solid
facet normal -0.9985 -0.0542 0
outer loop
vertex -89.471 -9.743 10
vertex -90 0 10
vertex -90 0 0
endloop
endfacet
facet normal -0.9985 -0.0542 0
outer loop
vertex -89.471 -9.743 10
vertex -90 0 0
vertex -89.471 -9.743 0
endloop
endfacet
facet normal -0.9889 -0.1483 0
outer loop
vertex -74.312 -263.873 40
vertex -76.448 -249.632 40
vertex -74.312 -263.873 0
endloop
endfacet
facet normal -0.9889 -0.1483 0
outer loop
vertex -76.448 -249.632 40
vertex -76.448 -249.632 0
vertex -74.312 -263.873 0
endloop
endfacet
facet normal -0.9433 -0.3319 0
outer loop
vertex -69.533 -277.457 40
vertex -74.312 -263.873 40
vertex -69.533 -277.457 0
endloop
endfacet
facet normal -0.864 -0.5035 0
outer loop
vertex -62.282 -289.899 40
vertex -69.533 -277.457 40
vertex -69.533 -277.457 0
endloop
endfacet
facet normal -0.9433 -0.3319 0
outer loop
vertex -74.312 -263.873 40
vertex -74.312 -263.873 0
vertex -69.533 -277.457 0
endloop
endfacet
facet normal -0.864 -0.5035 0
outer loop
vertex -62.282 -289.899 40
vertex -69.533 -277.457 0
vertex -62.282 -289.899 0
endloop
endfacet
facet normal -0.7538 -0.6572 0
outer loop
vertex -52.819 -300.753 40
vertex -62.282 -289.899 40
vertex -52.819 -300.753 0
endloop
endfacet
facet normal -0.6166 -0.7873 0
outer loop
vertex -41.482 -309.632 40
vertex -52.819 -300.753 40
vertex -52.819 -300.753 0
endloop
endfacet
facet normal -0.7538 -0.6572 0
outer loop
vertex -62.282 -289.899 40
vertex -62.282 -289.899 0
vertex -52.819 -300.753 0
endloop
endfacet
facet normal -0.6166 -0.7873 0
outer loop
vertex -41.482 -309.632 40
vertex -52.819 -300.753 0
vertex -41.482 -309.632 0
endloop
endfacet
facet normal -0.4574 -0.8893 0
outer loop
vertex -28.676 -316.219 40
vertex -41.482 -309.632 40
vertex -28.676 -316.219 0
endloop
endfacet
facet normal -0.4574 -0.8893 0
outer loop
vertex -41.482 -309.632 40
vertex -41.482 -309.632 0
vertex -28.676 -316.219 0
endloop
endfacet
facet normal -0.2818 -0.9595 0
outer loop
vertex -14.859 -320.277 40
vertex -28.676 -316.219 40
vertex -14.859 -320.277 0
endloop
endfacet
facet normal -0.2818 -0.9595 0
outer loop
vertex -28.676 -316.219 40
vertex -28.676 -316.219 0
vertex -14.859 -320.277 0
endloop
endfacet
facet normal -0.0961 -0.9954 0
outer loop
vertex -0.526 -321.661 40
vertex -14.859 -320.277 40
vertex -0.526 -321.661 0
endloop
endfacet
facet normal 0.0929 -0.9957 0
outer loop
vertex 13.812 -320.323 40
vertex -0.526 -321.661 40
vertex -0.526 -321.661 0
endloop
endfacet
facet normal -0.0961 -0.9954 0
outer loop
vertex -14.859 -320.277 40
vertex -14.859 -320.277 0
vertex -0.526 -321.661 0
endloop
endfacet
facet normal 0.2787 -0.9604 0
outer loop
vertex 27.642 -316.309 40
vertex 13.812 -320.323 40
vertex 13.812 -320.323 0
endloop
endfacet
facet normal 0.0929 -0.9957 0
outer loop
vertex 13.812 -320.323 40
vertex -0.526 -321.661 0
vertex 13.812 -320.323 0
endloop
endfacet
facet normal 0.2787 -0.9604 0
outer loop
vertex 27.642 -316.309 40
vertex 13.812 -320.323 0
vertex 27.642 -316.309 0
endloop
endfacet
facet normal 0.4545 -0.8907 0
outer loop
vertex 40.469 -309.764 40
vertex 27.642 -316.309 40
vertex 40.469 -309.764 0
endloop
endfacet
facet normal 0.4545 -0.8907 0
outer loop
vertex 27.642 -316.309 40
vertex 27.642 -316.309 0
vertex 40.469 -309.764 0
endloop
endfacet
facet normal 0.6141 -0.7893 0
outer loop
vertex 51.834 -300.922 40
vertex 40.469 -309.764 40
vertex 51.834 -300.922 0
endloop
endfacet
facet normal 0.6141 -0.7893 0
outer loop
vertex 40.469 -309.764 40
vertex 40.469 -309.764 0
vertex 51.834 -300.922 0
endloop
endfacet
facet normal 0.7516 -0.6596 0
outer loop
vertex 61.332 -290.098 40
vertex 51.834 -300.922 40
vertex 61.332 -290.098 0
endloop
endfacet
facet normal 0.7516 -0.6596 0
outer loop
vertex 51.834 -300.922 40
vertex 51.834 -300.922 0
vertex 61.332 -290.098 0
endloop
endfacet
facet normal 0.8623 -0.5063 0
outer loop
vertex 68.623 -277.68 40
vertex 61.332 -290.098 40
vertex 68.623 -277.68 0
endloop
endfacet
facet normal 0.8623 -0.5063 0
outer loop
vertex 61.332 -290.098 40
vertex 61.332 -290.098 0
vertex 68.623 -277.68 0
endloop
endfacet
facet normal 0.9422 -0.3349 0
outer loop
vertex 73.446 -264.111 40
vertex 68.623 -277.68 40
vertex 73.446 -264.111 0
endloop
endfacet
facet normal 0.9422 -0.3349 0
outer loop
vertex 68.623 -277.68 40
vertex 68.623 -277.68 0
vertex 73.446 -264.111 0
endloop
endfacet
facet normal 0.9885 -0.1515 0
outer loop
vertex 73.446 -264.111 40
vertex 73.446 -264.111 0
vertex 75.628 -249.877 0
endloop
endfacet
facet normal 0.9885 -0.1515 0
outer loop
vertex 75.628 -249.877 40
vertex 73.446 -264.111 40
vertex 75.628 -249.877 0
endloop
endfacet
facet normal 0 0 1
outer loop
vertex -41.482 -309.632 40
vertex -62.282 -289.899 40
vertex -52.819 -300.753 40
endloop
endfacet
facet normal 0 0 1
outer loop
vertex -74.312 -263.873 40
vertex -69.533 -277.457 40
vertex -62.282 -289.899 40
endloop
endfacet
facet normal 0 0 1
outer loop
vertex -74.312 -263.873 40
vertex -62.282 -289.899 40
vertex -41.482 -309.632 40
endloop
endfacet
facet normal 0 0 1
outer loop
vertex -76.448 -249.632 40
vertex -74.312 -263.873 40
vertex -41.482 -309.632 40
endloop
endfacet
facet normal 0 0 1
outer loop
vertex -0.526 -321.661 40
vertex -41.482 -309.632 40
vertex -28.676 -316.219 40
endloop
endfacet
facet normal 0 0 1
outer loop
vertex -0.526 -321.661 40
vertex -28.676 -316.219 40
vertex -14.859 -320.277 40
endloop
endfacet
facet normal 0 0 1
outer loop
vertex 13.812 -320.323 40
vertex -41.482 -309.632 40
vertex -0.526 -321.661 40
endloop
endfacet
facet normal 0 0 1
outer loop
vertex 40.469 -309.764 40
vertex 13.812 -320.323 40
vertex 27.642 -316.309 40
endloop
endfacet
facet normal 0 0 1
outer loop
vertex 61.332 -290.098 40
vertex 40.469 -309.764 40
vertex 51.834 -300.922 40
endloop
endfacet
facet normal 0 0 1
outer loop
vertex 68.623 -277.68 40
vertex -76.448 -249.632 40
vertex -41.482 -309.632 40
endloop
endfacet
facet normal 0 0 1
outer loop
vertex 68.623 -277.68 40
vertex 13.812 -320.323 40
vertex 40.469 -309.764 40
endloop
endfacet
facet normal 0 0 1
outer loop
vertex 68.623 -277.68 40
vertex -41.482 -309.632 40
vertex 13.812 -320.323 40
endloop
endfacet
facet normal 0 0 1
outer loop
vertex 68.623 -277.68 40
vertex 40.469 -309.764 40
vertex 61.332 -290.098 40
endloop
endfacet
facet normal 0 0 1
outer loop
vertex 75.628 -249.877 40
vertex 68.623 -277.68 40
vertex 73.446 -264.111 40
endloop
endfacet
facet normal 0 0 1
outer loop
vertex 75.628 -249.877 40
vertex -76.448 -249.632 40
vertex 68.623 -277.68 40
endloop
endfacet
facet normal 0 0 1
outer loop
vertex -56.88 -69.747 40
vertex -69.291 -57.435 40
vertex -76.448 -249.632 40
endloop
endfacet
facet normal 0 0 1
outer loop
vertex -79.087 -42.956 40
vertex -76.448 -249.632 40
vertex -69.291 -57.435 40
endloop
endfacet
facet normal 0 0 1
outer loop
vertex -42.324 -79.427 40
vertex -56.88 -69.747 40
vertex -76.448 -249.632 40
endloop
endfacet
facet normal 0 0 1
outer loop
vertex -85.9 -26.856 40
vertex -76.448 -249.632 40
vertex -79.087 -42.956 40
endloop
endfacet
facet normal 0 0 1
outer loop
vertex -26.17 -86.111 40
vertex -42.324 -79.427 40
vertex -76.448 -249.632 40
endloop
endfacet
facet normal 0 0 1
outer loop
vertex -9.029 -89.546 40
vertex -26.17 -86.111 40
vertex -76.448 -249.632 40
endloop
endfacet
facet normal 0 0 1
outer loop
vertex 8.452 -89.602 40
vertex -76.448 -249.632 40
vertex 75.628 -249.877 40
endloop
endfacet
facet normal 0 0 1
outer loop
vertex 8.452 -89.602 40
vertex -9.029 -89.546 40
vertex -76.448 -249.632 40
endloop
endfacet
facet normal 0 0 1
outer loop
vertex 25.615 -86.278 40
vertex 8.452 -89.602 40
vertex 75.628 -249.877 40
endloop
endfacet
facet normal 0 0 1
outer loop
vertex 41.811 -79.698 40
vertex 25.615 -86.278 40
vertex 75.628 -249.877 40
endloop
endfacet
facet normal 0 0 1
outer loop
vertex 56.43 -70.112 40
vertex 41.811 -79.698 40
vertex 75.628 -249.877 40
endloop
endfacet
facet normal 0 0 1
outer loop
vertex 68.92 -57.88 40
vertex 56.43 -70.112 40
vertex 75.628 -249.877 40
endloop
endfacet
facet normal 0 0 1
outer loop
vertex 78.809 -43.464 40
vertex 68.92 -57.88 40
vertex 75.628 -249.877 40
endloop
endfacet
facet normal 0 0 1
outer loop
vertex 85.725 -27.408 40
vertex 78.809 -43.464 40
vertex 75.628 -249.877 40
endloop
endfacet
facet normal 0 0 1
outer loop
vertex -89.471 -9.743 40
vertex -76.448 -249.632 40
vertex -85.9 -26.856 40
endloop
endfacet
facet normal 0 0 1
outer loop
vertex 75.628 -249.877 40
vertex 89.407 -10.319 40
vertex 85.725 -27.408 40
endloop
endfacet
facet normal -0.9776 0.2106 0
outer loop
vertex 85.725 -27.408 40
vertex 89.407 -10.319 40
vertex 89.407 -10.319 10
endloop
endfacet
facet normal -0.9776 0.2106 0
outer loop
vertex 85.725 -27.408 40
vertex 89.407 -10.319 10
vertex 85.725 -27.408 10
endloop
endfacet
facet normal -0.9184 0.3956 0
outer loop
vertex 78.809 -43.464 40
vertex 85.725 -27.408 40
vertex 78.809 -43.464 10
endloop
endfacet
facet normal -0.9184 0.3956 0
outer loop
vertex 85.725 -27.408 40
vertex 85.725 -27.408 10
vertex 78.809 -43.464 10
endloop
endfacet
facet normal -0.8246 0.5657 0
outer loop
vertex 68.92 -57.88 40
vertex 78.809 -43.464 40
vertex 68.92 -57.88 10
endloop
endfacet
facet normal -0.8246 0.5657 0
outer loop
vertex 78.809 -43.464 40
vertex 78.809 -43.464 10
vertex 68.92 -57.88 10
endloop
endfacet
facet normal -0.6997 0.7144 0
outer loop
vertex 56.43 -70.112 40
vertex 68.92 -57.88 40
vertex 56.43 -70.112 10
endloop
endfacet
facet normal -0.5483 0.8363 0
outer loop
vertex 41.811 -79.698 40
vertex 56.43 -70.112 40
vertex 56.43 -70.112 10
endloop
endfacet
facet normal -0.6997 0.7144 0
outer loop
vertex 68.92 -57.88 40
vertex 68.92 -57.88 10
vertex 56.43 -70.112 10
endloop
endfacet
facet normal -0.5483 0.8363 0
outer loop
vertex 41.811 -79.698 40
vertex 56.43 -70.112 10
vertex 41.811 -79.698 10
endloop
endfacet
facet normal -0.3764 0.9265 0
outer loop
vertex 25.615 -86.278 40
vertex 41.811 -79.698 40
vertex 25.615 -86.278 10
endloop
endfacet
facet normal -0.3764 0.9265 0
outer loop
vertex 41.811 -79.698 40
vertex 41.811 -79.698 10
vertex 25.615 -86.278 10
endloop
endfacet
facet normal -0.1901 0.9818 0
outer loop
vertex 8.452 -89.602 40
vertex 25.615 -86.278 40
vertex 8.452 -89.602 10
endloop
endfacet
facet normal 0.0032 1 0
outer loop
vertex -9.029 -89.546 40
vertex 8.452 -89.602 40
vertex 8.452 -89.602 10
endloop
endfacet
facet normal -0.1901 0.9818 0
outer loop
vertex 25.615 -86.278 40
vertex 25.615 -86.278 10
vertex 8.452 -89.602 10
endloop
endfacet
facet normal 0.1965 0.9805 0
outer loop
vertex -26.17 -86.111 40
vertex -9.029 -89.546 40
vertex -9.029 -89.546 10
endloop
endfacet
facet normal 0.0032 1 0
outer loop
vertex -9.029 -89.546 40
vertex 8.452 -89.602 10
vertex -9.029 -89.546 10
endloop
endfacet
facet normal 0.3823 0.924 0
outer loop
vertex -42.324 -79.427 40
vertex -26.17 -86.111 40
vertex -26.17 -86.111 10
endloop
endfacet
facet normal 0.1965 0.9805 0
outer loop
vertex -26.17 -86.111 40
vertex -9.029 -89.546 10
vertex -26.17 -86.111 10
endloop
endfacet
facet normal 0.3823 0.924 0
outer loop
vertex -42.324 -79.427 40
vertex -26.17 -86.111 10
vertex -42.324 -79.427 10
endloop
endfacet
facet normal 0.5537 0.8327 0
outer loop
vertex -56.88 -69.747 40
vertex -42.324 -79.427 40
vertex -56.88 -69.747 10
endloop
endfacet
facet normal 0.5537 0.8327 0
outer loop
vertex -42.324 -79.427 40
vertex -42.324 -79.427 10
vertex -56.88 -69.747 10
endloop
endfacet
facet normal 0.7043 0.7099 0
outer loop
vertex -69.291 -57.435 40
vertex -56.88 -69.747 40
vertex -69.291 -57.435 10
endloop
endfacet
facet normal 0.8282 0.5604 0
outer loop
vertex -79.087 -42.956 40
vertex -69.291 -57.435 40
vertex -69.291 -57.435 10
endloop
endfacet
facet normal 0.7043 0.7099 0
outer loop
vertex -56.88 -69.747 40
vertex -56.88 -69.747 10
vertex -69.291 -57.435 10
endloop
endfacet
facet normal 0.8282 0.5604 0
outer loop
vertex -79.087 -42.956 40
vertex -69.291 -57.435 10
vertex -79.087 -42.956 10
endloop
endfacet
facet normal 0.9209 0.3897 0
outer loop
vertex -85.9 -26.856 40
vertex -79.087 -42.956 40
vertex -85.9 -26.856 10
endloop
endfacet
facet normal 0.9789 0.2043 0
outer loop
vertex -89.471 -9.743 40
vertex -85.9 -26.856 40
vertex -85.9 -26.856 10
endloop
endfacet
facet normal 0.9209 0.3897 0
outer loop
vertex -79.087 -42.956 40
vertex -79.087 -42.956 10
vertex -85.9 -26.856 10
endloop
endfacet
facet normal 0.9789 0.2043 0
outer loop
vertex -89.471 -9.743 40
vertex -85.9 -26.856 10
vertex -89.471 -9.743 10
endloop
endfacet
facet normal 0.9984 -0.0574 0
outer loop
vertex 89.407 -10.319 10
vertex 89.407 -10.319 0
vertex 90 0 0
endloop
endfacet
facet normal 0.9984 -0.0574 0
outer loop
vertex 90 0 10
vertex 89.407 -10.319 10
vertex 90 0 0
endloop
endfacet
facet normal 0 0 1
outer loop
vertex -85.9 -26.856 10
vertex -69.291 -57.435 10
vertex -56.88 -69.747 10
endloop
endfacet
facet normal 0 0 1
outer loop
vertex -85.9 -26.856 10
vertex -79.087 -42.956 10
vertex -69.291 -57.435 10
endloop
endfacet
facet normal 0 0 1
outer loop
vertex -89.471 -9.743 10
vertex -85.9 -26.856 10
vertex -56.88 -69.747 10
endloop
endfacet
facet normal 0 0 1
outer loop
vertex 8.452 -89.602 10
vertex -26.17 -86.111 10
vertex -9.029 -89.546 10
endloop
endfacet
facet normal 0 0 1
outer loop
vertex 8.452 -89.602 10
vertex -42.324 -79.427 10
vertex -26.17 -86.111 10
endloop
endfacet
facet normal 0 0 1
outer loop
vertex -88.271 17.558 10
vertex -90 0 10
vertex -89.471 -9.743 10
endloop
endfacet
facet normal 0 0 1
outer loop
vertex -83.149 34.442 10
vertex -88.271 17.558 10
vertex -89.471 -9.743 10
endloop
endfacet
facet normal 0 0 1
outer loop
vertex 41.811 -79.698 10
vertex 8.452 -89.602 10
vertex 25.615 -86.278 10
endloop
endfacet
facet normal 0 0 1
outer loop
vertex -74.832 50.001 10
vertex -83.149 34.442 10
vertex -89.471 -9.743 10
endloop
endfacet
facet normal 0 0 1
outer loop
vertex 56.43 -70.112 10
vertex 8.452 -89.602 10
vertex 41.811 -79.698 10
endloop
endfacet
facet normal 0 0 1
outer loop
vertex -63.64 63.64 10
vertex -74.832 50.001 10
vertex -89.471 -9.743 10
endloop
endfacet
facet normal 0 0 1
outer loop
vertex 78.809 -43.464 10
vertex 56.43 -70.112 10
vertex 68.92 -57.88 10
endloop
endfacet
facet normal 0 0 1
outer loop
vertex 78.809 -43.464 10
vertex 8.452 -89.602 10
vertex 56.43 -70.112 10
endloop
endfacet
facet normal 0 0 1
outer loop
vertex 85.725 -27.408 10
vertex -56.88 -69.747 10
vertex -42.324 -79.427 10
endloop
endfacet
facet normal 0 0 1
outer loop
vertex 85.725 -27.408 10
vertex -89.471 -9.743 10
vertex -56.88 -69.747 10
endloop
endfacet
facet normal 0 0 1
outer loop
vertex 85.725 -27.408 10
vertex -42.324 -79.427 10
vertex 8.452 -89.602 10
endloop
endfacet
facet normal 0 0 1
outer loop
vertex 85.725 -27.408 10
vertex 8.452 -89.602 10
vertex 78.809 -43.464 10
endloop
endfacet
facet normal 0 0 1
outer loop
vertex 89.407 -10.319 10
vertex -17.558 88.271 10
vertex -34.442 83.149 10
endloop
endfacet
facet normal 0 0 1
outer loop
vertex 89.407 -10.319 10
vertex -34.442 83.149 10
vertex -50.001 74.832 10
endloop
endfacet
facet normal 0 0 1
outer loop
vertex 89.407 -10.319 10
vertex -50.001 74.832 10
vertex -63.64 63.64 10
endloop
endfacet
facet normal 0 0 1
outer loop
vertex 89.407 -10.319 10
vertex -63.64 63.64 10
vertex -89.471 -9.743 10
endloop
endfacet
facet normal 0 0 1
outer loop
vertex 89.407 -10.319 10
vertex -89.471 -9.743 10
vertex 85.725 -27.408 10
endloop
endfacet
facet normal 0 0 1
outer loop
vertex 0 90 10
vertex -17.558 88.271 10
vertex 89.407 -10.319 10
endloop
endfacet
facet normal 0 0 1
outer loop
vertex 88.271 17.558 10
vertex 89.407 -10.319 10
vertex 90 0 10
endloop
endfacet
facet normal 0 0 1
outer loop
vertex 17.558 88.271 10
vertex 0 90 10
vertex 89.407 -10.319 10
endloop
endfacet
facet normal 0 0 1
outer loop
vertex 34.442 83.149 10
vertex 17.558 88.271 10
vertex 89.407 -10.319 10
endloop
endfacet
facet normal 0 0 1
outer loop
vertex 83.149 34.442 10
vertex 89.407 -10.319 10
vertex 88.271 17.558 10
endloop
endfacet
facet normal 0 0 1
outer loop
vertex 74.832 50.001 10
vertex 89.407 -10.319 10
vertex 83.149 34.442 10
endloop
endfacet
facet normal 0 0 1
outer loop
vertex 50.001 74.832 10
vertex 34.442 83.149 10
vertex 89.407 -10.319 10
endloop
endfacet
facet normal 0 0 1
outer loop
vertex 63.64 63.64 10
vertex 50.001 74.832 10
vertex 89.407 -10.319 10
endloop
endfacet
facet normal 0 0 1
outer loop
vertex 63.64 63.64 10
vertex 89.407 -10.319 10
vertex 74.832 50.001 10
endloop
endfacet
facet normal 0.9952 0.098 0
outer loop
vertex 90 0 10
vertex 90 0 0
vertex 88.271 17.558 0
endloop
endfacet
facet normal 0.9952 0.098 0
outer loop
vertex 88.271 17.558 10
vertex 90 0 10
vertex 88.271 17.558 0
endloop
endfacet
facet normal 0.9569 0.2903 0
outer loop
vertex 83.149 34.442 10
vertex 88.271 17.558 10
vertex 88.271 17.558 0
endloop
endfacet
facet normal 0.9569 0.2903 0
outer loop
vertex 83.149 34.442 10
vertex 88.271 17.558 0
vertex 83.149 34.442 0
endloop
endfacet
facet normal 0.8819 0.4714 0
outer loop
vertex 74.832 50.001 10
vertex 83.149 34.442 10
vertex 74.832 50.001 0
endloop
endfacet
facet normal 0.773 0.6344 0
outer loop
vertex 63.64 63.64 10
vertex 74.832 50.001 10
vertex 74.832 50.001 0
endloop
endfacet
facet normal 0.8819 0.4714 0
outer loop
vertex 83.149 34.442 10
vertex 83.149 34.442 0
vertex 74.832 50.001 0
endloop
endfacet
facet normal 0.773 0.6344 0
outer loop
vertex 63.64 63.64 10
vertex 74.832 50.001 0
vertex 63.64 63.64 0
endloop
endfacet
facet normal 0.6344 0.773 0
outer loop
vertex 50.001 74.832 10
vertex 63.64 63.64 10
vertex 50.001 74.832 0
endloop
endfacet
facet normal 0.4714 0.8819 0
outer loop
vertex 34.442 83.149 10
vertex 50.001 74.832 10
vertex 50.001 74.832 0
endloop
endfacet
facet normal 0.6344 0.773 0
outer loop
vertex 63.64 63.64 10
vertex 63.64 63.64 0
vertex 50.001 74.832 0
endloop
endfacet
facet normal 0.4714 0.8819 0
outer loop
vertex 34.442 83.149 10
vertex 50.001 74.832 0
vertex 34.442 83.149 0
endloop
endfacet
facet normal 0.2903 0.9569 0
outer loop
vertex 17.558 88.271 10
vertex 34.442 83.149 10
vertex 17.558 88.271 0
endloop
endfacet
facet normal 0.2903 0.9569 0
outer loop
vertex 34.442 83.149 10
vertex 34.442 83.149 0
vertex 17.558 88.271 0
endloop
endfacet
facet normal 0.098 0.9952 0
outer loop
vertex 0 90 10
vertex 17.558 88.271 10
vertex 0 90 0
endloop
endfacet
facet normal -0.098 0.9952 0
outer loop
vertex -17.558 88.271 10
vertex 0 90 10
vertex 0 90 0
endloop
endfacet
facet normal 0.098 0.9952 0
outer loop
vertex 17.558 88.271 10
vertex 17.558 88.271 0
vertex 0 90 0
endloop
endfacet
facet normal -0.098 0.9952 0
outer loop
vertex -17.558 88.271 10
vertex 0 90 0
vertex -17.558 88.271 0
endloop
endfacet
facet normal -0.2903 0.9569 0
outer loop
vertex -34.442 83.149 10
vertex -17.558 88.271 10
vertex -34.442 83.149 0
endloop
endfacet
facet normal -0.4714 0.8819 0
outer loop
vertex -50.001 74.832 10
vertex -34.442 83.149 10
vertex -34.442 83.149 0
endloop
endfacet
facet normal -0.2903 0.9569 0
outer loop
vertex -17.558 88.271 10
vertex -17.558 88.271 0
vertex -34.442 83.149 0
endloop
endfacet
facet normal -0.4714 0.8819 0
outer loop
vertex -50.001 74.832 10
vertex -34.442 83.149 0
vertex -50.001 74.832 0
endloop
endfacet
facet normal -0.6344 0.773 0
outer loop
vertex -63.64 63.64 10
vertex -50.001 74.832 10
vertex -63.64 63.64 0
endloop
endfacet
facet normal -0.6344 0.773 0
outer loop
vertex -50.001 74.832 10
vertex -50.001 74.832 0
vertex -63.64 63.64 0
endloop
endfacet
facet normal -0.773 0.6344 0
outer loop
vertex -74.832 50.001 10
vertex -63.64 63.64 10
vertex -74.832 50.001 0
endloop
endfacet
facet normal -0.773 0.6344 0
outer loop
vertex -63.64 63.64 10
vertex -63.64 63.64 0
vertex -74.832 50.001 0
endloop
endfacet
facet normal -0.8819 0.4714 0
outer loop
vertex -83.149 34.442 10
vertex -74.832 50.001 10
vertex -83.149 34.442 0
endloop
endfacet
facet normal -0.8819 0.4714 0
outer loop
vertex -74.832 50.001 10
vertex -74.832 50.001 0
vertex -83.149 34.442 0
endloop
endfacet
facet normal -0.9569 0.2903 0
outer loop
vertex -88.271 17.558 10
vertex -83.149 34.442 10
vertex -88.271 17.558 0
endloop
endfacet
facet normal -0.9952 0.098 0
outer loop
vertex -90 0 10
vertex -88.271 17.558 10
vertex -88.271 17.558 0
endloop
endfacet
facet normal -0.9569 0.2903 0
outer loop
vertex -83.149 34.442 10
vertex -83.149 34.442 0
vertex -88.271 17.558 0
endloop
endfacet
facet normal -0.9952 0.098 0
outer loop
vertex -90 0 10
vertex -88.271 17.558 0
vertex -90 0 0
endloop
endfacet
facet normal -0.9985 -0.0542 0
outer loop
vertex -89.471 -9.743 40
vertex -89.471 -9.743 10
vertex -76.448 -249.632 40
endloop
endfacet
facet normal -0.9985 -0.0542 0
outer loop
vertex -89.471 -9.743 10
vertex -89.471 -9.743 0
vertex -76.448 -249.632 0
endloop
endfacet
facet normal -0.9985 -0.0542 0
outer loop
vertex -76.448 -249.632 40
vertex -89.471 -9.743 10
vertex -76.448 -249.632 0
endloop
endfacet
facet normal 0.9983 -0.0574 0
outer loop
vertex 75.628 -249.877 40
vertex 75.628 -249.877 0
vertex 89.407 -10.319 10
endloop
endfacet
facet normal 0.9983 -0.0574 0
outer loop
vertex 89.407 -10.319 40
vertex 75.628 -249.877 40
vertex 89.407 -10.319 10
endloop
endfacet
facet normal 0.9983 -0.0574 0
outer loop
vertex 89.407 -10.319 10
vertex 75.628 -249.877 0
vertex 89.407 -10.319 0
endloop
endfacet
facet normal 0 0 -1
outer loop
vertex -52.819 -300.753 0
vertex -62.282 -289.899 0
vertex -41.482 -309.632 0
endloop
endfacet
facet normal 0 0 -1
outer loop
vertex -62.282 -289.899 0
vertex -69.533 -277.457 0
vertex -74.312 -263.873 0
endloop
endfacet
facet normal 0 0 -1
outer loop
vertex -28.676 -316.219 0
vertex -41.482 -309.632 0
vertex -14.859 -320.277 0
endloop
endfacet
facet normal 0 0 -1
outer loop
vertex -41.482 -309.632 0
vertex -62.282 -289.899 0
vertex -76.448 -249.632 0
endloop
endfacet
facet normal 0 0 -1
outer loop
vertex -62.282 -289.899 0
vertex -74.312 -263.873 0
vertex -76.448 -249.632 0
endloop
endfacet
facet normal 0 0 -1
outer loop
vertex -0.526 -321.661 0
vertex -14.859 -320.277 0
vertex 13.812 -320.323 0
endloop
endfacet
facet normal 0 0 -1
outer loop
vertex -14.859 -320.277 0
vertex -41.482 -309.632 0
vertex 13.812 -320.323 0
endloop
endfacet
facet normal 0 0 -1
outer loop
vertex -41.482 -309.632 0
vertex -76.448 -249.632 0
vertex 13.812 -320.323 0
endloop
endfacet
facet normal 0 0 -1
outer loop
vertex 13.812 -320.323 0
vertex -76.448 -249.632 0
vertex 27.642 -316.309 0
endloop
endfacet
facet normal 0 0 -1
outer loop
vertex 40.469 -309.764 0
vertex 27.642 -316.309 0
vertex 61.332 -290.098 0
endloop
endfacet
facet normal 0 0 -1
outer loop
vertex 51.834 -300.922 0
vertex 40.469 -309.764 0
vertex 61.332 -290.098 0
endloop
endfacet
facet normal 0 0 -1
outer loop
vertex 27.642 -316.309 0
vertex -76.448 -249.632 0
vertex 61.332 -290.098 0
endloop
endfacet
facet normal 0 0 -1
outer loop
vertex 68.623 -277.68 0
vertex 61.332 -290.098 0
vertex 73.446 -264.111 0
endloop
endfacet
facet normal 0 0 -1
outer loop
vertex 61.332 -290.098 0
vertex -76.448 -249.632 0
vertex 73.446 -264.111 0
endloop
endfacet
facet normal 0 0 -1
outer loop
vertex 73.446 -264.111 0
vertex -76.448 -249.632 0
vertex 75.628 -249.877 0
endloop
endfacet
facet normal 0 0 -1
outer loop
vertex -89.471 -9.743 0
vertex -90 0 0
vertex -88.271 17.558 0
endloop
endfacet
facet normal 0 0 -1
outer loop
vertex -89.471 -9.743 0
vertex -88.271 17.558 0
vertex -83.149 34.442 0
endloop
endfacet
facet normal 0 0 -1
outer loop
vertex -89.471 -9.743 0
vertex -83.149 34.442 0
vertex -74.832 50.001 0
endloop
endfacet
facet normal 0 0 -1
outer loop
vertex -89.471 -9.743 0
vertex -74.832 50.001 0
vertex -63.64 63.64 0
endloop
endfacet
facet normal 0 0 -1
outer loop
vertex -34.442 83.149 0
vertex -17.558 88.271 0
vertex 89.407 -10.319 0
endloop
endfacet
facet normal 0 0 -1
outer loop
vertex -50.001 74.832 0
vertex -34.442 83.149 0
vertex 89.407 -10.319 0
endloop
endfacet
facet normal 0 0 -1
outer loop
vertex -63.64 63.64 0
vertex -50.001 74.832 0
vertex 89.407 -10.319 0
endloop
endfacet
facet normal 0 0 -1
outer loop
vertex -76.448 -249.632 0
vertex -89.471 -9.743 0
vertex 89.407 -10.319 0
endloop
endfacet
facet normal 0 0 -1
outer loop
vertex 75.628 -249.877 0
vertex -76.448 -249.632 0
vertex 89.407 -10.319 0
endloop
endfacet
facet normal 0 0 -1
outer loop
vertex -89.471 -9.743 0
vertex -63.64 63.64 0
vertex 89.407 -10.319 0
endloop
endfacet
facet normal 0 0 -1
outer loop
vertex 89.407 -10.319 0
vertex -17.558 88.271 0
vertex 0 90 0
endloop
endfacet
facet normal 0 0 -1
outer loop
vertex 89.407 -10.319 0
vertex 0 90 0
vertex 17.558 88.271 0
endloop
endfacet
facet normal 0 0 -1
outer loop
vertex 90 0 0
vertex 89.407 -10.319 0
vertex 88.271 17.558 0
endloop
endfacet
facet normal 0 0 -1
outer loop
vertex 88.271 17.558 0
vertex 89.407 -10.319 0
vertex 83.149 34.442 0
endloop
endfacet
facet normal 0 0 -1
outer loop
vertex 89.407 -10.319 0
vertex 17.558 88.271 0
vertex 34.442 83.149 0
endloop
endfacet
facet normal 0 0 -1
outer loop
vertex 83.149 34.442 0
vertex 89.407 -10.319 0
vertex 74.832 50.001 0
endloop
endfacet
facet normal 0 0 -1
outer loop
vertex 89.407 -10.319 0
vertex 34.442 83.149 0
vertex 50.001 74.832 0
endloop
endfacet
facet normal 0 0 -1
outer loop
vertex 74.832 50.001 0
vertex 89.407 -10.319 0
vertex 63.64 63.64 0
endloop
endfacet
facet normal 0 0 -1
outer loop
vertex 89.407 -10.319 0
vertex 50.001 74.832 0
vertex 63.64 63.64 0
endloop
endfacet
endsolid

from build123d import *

# Parameters (mm, degrees)
BOSS_EXTRUDE3_DEPTH = 10
BOSS_EXTRUDE4_DEPTH = 30


with BuildPart() as part:
    # Sketch2 → Boss-Extrude3 (new body)
    with BuildSketch(Plane.XY):
        with BuildLine():
            ThreePointArc((90, 0), (0, 90), (-90, 0))
            Line((-90, 0), (-89.471097217, -9.742831353))
            ThreePointArc((-89.471097217, -9.742831353), (-0.289758357, -89.999533555), (89.406507913, -10.318737459))
            Line((89.406507913, -10.318737459), (90, 0))
        make_face()
        with BuildLine():
            ThreePointArc((89.406507913, -10.318737459), (-0.289758357, -89.999533555), (-89.471097217, -9.742831353))
            Line((-89.471097217, -9.742831353), (-76.448369593, -249.632359432))
            ThreePointArc((-76.448369593, -249.632359432), (-0.525900188, -321.66108657), (75.628074906, -249.877167959))
            Line((75.628074906, -249.877167959), (89.406507913, -10.318737459))
        make_face()
    extrude(amount=BOSS_EXTRUDE3_DEPTH)

    # Sketch3 → Boss-Extrude4 (add)
    with BuildSketch(Plane.XY.offset(10)):
        with BuildLine():
            ThreePointArc((89.406507913, -10.318737459), (-0.289758357, -89.999533555), (-89.471097217, -9.742831353))
            Line((-89.471097217, -9.742831353), (-76.448369593, -249.632359432))
            ThreePointArc((-76.448369593, -249.632359432), (-0.525900188, -321.66108657), (75.628074906, -249.877167959))
            Line((75.628074906, -249.877167959), (89.406507913, -10.318737459))
        make_face()
    extrude(amount=BOSS_EXTRUDE4_DEPTH)


solid = part.part
